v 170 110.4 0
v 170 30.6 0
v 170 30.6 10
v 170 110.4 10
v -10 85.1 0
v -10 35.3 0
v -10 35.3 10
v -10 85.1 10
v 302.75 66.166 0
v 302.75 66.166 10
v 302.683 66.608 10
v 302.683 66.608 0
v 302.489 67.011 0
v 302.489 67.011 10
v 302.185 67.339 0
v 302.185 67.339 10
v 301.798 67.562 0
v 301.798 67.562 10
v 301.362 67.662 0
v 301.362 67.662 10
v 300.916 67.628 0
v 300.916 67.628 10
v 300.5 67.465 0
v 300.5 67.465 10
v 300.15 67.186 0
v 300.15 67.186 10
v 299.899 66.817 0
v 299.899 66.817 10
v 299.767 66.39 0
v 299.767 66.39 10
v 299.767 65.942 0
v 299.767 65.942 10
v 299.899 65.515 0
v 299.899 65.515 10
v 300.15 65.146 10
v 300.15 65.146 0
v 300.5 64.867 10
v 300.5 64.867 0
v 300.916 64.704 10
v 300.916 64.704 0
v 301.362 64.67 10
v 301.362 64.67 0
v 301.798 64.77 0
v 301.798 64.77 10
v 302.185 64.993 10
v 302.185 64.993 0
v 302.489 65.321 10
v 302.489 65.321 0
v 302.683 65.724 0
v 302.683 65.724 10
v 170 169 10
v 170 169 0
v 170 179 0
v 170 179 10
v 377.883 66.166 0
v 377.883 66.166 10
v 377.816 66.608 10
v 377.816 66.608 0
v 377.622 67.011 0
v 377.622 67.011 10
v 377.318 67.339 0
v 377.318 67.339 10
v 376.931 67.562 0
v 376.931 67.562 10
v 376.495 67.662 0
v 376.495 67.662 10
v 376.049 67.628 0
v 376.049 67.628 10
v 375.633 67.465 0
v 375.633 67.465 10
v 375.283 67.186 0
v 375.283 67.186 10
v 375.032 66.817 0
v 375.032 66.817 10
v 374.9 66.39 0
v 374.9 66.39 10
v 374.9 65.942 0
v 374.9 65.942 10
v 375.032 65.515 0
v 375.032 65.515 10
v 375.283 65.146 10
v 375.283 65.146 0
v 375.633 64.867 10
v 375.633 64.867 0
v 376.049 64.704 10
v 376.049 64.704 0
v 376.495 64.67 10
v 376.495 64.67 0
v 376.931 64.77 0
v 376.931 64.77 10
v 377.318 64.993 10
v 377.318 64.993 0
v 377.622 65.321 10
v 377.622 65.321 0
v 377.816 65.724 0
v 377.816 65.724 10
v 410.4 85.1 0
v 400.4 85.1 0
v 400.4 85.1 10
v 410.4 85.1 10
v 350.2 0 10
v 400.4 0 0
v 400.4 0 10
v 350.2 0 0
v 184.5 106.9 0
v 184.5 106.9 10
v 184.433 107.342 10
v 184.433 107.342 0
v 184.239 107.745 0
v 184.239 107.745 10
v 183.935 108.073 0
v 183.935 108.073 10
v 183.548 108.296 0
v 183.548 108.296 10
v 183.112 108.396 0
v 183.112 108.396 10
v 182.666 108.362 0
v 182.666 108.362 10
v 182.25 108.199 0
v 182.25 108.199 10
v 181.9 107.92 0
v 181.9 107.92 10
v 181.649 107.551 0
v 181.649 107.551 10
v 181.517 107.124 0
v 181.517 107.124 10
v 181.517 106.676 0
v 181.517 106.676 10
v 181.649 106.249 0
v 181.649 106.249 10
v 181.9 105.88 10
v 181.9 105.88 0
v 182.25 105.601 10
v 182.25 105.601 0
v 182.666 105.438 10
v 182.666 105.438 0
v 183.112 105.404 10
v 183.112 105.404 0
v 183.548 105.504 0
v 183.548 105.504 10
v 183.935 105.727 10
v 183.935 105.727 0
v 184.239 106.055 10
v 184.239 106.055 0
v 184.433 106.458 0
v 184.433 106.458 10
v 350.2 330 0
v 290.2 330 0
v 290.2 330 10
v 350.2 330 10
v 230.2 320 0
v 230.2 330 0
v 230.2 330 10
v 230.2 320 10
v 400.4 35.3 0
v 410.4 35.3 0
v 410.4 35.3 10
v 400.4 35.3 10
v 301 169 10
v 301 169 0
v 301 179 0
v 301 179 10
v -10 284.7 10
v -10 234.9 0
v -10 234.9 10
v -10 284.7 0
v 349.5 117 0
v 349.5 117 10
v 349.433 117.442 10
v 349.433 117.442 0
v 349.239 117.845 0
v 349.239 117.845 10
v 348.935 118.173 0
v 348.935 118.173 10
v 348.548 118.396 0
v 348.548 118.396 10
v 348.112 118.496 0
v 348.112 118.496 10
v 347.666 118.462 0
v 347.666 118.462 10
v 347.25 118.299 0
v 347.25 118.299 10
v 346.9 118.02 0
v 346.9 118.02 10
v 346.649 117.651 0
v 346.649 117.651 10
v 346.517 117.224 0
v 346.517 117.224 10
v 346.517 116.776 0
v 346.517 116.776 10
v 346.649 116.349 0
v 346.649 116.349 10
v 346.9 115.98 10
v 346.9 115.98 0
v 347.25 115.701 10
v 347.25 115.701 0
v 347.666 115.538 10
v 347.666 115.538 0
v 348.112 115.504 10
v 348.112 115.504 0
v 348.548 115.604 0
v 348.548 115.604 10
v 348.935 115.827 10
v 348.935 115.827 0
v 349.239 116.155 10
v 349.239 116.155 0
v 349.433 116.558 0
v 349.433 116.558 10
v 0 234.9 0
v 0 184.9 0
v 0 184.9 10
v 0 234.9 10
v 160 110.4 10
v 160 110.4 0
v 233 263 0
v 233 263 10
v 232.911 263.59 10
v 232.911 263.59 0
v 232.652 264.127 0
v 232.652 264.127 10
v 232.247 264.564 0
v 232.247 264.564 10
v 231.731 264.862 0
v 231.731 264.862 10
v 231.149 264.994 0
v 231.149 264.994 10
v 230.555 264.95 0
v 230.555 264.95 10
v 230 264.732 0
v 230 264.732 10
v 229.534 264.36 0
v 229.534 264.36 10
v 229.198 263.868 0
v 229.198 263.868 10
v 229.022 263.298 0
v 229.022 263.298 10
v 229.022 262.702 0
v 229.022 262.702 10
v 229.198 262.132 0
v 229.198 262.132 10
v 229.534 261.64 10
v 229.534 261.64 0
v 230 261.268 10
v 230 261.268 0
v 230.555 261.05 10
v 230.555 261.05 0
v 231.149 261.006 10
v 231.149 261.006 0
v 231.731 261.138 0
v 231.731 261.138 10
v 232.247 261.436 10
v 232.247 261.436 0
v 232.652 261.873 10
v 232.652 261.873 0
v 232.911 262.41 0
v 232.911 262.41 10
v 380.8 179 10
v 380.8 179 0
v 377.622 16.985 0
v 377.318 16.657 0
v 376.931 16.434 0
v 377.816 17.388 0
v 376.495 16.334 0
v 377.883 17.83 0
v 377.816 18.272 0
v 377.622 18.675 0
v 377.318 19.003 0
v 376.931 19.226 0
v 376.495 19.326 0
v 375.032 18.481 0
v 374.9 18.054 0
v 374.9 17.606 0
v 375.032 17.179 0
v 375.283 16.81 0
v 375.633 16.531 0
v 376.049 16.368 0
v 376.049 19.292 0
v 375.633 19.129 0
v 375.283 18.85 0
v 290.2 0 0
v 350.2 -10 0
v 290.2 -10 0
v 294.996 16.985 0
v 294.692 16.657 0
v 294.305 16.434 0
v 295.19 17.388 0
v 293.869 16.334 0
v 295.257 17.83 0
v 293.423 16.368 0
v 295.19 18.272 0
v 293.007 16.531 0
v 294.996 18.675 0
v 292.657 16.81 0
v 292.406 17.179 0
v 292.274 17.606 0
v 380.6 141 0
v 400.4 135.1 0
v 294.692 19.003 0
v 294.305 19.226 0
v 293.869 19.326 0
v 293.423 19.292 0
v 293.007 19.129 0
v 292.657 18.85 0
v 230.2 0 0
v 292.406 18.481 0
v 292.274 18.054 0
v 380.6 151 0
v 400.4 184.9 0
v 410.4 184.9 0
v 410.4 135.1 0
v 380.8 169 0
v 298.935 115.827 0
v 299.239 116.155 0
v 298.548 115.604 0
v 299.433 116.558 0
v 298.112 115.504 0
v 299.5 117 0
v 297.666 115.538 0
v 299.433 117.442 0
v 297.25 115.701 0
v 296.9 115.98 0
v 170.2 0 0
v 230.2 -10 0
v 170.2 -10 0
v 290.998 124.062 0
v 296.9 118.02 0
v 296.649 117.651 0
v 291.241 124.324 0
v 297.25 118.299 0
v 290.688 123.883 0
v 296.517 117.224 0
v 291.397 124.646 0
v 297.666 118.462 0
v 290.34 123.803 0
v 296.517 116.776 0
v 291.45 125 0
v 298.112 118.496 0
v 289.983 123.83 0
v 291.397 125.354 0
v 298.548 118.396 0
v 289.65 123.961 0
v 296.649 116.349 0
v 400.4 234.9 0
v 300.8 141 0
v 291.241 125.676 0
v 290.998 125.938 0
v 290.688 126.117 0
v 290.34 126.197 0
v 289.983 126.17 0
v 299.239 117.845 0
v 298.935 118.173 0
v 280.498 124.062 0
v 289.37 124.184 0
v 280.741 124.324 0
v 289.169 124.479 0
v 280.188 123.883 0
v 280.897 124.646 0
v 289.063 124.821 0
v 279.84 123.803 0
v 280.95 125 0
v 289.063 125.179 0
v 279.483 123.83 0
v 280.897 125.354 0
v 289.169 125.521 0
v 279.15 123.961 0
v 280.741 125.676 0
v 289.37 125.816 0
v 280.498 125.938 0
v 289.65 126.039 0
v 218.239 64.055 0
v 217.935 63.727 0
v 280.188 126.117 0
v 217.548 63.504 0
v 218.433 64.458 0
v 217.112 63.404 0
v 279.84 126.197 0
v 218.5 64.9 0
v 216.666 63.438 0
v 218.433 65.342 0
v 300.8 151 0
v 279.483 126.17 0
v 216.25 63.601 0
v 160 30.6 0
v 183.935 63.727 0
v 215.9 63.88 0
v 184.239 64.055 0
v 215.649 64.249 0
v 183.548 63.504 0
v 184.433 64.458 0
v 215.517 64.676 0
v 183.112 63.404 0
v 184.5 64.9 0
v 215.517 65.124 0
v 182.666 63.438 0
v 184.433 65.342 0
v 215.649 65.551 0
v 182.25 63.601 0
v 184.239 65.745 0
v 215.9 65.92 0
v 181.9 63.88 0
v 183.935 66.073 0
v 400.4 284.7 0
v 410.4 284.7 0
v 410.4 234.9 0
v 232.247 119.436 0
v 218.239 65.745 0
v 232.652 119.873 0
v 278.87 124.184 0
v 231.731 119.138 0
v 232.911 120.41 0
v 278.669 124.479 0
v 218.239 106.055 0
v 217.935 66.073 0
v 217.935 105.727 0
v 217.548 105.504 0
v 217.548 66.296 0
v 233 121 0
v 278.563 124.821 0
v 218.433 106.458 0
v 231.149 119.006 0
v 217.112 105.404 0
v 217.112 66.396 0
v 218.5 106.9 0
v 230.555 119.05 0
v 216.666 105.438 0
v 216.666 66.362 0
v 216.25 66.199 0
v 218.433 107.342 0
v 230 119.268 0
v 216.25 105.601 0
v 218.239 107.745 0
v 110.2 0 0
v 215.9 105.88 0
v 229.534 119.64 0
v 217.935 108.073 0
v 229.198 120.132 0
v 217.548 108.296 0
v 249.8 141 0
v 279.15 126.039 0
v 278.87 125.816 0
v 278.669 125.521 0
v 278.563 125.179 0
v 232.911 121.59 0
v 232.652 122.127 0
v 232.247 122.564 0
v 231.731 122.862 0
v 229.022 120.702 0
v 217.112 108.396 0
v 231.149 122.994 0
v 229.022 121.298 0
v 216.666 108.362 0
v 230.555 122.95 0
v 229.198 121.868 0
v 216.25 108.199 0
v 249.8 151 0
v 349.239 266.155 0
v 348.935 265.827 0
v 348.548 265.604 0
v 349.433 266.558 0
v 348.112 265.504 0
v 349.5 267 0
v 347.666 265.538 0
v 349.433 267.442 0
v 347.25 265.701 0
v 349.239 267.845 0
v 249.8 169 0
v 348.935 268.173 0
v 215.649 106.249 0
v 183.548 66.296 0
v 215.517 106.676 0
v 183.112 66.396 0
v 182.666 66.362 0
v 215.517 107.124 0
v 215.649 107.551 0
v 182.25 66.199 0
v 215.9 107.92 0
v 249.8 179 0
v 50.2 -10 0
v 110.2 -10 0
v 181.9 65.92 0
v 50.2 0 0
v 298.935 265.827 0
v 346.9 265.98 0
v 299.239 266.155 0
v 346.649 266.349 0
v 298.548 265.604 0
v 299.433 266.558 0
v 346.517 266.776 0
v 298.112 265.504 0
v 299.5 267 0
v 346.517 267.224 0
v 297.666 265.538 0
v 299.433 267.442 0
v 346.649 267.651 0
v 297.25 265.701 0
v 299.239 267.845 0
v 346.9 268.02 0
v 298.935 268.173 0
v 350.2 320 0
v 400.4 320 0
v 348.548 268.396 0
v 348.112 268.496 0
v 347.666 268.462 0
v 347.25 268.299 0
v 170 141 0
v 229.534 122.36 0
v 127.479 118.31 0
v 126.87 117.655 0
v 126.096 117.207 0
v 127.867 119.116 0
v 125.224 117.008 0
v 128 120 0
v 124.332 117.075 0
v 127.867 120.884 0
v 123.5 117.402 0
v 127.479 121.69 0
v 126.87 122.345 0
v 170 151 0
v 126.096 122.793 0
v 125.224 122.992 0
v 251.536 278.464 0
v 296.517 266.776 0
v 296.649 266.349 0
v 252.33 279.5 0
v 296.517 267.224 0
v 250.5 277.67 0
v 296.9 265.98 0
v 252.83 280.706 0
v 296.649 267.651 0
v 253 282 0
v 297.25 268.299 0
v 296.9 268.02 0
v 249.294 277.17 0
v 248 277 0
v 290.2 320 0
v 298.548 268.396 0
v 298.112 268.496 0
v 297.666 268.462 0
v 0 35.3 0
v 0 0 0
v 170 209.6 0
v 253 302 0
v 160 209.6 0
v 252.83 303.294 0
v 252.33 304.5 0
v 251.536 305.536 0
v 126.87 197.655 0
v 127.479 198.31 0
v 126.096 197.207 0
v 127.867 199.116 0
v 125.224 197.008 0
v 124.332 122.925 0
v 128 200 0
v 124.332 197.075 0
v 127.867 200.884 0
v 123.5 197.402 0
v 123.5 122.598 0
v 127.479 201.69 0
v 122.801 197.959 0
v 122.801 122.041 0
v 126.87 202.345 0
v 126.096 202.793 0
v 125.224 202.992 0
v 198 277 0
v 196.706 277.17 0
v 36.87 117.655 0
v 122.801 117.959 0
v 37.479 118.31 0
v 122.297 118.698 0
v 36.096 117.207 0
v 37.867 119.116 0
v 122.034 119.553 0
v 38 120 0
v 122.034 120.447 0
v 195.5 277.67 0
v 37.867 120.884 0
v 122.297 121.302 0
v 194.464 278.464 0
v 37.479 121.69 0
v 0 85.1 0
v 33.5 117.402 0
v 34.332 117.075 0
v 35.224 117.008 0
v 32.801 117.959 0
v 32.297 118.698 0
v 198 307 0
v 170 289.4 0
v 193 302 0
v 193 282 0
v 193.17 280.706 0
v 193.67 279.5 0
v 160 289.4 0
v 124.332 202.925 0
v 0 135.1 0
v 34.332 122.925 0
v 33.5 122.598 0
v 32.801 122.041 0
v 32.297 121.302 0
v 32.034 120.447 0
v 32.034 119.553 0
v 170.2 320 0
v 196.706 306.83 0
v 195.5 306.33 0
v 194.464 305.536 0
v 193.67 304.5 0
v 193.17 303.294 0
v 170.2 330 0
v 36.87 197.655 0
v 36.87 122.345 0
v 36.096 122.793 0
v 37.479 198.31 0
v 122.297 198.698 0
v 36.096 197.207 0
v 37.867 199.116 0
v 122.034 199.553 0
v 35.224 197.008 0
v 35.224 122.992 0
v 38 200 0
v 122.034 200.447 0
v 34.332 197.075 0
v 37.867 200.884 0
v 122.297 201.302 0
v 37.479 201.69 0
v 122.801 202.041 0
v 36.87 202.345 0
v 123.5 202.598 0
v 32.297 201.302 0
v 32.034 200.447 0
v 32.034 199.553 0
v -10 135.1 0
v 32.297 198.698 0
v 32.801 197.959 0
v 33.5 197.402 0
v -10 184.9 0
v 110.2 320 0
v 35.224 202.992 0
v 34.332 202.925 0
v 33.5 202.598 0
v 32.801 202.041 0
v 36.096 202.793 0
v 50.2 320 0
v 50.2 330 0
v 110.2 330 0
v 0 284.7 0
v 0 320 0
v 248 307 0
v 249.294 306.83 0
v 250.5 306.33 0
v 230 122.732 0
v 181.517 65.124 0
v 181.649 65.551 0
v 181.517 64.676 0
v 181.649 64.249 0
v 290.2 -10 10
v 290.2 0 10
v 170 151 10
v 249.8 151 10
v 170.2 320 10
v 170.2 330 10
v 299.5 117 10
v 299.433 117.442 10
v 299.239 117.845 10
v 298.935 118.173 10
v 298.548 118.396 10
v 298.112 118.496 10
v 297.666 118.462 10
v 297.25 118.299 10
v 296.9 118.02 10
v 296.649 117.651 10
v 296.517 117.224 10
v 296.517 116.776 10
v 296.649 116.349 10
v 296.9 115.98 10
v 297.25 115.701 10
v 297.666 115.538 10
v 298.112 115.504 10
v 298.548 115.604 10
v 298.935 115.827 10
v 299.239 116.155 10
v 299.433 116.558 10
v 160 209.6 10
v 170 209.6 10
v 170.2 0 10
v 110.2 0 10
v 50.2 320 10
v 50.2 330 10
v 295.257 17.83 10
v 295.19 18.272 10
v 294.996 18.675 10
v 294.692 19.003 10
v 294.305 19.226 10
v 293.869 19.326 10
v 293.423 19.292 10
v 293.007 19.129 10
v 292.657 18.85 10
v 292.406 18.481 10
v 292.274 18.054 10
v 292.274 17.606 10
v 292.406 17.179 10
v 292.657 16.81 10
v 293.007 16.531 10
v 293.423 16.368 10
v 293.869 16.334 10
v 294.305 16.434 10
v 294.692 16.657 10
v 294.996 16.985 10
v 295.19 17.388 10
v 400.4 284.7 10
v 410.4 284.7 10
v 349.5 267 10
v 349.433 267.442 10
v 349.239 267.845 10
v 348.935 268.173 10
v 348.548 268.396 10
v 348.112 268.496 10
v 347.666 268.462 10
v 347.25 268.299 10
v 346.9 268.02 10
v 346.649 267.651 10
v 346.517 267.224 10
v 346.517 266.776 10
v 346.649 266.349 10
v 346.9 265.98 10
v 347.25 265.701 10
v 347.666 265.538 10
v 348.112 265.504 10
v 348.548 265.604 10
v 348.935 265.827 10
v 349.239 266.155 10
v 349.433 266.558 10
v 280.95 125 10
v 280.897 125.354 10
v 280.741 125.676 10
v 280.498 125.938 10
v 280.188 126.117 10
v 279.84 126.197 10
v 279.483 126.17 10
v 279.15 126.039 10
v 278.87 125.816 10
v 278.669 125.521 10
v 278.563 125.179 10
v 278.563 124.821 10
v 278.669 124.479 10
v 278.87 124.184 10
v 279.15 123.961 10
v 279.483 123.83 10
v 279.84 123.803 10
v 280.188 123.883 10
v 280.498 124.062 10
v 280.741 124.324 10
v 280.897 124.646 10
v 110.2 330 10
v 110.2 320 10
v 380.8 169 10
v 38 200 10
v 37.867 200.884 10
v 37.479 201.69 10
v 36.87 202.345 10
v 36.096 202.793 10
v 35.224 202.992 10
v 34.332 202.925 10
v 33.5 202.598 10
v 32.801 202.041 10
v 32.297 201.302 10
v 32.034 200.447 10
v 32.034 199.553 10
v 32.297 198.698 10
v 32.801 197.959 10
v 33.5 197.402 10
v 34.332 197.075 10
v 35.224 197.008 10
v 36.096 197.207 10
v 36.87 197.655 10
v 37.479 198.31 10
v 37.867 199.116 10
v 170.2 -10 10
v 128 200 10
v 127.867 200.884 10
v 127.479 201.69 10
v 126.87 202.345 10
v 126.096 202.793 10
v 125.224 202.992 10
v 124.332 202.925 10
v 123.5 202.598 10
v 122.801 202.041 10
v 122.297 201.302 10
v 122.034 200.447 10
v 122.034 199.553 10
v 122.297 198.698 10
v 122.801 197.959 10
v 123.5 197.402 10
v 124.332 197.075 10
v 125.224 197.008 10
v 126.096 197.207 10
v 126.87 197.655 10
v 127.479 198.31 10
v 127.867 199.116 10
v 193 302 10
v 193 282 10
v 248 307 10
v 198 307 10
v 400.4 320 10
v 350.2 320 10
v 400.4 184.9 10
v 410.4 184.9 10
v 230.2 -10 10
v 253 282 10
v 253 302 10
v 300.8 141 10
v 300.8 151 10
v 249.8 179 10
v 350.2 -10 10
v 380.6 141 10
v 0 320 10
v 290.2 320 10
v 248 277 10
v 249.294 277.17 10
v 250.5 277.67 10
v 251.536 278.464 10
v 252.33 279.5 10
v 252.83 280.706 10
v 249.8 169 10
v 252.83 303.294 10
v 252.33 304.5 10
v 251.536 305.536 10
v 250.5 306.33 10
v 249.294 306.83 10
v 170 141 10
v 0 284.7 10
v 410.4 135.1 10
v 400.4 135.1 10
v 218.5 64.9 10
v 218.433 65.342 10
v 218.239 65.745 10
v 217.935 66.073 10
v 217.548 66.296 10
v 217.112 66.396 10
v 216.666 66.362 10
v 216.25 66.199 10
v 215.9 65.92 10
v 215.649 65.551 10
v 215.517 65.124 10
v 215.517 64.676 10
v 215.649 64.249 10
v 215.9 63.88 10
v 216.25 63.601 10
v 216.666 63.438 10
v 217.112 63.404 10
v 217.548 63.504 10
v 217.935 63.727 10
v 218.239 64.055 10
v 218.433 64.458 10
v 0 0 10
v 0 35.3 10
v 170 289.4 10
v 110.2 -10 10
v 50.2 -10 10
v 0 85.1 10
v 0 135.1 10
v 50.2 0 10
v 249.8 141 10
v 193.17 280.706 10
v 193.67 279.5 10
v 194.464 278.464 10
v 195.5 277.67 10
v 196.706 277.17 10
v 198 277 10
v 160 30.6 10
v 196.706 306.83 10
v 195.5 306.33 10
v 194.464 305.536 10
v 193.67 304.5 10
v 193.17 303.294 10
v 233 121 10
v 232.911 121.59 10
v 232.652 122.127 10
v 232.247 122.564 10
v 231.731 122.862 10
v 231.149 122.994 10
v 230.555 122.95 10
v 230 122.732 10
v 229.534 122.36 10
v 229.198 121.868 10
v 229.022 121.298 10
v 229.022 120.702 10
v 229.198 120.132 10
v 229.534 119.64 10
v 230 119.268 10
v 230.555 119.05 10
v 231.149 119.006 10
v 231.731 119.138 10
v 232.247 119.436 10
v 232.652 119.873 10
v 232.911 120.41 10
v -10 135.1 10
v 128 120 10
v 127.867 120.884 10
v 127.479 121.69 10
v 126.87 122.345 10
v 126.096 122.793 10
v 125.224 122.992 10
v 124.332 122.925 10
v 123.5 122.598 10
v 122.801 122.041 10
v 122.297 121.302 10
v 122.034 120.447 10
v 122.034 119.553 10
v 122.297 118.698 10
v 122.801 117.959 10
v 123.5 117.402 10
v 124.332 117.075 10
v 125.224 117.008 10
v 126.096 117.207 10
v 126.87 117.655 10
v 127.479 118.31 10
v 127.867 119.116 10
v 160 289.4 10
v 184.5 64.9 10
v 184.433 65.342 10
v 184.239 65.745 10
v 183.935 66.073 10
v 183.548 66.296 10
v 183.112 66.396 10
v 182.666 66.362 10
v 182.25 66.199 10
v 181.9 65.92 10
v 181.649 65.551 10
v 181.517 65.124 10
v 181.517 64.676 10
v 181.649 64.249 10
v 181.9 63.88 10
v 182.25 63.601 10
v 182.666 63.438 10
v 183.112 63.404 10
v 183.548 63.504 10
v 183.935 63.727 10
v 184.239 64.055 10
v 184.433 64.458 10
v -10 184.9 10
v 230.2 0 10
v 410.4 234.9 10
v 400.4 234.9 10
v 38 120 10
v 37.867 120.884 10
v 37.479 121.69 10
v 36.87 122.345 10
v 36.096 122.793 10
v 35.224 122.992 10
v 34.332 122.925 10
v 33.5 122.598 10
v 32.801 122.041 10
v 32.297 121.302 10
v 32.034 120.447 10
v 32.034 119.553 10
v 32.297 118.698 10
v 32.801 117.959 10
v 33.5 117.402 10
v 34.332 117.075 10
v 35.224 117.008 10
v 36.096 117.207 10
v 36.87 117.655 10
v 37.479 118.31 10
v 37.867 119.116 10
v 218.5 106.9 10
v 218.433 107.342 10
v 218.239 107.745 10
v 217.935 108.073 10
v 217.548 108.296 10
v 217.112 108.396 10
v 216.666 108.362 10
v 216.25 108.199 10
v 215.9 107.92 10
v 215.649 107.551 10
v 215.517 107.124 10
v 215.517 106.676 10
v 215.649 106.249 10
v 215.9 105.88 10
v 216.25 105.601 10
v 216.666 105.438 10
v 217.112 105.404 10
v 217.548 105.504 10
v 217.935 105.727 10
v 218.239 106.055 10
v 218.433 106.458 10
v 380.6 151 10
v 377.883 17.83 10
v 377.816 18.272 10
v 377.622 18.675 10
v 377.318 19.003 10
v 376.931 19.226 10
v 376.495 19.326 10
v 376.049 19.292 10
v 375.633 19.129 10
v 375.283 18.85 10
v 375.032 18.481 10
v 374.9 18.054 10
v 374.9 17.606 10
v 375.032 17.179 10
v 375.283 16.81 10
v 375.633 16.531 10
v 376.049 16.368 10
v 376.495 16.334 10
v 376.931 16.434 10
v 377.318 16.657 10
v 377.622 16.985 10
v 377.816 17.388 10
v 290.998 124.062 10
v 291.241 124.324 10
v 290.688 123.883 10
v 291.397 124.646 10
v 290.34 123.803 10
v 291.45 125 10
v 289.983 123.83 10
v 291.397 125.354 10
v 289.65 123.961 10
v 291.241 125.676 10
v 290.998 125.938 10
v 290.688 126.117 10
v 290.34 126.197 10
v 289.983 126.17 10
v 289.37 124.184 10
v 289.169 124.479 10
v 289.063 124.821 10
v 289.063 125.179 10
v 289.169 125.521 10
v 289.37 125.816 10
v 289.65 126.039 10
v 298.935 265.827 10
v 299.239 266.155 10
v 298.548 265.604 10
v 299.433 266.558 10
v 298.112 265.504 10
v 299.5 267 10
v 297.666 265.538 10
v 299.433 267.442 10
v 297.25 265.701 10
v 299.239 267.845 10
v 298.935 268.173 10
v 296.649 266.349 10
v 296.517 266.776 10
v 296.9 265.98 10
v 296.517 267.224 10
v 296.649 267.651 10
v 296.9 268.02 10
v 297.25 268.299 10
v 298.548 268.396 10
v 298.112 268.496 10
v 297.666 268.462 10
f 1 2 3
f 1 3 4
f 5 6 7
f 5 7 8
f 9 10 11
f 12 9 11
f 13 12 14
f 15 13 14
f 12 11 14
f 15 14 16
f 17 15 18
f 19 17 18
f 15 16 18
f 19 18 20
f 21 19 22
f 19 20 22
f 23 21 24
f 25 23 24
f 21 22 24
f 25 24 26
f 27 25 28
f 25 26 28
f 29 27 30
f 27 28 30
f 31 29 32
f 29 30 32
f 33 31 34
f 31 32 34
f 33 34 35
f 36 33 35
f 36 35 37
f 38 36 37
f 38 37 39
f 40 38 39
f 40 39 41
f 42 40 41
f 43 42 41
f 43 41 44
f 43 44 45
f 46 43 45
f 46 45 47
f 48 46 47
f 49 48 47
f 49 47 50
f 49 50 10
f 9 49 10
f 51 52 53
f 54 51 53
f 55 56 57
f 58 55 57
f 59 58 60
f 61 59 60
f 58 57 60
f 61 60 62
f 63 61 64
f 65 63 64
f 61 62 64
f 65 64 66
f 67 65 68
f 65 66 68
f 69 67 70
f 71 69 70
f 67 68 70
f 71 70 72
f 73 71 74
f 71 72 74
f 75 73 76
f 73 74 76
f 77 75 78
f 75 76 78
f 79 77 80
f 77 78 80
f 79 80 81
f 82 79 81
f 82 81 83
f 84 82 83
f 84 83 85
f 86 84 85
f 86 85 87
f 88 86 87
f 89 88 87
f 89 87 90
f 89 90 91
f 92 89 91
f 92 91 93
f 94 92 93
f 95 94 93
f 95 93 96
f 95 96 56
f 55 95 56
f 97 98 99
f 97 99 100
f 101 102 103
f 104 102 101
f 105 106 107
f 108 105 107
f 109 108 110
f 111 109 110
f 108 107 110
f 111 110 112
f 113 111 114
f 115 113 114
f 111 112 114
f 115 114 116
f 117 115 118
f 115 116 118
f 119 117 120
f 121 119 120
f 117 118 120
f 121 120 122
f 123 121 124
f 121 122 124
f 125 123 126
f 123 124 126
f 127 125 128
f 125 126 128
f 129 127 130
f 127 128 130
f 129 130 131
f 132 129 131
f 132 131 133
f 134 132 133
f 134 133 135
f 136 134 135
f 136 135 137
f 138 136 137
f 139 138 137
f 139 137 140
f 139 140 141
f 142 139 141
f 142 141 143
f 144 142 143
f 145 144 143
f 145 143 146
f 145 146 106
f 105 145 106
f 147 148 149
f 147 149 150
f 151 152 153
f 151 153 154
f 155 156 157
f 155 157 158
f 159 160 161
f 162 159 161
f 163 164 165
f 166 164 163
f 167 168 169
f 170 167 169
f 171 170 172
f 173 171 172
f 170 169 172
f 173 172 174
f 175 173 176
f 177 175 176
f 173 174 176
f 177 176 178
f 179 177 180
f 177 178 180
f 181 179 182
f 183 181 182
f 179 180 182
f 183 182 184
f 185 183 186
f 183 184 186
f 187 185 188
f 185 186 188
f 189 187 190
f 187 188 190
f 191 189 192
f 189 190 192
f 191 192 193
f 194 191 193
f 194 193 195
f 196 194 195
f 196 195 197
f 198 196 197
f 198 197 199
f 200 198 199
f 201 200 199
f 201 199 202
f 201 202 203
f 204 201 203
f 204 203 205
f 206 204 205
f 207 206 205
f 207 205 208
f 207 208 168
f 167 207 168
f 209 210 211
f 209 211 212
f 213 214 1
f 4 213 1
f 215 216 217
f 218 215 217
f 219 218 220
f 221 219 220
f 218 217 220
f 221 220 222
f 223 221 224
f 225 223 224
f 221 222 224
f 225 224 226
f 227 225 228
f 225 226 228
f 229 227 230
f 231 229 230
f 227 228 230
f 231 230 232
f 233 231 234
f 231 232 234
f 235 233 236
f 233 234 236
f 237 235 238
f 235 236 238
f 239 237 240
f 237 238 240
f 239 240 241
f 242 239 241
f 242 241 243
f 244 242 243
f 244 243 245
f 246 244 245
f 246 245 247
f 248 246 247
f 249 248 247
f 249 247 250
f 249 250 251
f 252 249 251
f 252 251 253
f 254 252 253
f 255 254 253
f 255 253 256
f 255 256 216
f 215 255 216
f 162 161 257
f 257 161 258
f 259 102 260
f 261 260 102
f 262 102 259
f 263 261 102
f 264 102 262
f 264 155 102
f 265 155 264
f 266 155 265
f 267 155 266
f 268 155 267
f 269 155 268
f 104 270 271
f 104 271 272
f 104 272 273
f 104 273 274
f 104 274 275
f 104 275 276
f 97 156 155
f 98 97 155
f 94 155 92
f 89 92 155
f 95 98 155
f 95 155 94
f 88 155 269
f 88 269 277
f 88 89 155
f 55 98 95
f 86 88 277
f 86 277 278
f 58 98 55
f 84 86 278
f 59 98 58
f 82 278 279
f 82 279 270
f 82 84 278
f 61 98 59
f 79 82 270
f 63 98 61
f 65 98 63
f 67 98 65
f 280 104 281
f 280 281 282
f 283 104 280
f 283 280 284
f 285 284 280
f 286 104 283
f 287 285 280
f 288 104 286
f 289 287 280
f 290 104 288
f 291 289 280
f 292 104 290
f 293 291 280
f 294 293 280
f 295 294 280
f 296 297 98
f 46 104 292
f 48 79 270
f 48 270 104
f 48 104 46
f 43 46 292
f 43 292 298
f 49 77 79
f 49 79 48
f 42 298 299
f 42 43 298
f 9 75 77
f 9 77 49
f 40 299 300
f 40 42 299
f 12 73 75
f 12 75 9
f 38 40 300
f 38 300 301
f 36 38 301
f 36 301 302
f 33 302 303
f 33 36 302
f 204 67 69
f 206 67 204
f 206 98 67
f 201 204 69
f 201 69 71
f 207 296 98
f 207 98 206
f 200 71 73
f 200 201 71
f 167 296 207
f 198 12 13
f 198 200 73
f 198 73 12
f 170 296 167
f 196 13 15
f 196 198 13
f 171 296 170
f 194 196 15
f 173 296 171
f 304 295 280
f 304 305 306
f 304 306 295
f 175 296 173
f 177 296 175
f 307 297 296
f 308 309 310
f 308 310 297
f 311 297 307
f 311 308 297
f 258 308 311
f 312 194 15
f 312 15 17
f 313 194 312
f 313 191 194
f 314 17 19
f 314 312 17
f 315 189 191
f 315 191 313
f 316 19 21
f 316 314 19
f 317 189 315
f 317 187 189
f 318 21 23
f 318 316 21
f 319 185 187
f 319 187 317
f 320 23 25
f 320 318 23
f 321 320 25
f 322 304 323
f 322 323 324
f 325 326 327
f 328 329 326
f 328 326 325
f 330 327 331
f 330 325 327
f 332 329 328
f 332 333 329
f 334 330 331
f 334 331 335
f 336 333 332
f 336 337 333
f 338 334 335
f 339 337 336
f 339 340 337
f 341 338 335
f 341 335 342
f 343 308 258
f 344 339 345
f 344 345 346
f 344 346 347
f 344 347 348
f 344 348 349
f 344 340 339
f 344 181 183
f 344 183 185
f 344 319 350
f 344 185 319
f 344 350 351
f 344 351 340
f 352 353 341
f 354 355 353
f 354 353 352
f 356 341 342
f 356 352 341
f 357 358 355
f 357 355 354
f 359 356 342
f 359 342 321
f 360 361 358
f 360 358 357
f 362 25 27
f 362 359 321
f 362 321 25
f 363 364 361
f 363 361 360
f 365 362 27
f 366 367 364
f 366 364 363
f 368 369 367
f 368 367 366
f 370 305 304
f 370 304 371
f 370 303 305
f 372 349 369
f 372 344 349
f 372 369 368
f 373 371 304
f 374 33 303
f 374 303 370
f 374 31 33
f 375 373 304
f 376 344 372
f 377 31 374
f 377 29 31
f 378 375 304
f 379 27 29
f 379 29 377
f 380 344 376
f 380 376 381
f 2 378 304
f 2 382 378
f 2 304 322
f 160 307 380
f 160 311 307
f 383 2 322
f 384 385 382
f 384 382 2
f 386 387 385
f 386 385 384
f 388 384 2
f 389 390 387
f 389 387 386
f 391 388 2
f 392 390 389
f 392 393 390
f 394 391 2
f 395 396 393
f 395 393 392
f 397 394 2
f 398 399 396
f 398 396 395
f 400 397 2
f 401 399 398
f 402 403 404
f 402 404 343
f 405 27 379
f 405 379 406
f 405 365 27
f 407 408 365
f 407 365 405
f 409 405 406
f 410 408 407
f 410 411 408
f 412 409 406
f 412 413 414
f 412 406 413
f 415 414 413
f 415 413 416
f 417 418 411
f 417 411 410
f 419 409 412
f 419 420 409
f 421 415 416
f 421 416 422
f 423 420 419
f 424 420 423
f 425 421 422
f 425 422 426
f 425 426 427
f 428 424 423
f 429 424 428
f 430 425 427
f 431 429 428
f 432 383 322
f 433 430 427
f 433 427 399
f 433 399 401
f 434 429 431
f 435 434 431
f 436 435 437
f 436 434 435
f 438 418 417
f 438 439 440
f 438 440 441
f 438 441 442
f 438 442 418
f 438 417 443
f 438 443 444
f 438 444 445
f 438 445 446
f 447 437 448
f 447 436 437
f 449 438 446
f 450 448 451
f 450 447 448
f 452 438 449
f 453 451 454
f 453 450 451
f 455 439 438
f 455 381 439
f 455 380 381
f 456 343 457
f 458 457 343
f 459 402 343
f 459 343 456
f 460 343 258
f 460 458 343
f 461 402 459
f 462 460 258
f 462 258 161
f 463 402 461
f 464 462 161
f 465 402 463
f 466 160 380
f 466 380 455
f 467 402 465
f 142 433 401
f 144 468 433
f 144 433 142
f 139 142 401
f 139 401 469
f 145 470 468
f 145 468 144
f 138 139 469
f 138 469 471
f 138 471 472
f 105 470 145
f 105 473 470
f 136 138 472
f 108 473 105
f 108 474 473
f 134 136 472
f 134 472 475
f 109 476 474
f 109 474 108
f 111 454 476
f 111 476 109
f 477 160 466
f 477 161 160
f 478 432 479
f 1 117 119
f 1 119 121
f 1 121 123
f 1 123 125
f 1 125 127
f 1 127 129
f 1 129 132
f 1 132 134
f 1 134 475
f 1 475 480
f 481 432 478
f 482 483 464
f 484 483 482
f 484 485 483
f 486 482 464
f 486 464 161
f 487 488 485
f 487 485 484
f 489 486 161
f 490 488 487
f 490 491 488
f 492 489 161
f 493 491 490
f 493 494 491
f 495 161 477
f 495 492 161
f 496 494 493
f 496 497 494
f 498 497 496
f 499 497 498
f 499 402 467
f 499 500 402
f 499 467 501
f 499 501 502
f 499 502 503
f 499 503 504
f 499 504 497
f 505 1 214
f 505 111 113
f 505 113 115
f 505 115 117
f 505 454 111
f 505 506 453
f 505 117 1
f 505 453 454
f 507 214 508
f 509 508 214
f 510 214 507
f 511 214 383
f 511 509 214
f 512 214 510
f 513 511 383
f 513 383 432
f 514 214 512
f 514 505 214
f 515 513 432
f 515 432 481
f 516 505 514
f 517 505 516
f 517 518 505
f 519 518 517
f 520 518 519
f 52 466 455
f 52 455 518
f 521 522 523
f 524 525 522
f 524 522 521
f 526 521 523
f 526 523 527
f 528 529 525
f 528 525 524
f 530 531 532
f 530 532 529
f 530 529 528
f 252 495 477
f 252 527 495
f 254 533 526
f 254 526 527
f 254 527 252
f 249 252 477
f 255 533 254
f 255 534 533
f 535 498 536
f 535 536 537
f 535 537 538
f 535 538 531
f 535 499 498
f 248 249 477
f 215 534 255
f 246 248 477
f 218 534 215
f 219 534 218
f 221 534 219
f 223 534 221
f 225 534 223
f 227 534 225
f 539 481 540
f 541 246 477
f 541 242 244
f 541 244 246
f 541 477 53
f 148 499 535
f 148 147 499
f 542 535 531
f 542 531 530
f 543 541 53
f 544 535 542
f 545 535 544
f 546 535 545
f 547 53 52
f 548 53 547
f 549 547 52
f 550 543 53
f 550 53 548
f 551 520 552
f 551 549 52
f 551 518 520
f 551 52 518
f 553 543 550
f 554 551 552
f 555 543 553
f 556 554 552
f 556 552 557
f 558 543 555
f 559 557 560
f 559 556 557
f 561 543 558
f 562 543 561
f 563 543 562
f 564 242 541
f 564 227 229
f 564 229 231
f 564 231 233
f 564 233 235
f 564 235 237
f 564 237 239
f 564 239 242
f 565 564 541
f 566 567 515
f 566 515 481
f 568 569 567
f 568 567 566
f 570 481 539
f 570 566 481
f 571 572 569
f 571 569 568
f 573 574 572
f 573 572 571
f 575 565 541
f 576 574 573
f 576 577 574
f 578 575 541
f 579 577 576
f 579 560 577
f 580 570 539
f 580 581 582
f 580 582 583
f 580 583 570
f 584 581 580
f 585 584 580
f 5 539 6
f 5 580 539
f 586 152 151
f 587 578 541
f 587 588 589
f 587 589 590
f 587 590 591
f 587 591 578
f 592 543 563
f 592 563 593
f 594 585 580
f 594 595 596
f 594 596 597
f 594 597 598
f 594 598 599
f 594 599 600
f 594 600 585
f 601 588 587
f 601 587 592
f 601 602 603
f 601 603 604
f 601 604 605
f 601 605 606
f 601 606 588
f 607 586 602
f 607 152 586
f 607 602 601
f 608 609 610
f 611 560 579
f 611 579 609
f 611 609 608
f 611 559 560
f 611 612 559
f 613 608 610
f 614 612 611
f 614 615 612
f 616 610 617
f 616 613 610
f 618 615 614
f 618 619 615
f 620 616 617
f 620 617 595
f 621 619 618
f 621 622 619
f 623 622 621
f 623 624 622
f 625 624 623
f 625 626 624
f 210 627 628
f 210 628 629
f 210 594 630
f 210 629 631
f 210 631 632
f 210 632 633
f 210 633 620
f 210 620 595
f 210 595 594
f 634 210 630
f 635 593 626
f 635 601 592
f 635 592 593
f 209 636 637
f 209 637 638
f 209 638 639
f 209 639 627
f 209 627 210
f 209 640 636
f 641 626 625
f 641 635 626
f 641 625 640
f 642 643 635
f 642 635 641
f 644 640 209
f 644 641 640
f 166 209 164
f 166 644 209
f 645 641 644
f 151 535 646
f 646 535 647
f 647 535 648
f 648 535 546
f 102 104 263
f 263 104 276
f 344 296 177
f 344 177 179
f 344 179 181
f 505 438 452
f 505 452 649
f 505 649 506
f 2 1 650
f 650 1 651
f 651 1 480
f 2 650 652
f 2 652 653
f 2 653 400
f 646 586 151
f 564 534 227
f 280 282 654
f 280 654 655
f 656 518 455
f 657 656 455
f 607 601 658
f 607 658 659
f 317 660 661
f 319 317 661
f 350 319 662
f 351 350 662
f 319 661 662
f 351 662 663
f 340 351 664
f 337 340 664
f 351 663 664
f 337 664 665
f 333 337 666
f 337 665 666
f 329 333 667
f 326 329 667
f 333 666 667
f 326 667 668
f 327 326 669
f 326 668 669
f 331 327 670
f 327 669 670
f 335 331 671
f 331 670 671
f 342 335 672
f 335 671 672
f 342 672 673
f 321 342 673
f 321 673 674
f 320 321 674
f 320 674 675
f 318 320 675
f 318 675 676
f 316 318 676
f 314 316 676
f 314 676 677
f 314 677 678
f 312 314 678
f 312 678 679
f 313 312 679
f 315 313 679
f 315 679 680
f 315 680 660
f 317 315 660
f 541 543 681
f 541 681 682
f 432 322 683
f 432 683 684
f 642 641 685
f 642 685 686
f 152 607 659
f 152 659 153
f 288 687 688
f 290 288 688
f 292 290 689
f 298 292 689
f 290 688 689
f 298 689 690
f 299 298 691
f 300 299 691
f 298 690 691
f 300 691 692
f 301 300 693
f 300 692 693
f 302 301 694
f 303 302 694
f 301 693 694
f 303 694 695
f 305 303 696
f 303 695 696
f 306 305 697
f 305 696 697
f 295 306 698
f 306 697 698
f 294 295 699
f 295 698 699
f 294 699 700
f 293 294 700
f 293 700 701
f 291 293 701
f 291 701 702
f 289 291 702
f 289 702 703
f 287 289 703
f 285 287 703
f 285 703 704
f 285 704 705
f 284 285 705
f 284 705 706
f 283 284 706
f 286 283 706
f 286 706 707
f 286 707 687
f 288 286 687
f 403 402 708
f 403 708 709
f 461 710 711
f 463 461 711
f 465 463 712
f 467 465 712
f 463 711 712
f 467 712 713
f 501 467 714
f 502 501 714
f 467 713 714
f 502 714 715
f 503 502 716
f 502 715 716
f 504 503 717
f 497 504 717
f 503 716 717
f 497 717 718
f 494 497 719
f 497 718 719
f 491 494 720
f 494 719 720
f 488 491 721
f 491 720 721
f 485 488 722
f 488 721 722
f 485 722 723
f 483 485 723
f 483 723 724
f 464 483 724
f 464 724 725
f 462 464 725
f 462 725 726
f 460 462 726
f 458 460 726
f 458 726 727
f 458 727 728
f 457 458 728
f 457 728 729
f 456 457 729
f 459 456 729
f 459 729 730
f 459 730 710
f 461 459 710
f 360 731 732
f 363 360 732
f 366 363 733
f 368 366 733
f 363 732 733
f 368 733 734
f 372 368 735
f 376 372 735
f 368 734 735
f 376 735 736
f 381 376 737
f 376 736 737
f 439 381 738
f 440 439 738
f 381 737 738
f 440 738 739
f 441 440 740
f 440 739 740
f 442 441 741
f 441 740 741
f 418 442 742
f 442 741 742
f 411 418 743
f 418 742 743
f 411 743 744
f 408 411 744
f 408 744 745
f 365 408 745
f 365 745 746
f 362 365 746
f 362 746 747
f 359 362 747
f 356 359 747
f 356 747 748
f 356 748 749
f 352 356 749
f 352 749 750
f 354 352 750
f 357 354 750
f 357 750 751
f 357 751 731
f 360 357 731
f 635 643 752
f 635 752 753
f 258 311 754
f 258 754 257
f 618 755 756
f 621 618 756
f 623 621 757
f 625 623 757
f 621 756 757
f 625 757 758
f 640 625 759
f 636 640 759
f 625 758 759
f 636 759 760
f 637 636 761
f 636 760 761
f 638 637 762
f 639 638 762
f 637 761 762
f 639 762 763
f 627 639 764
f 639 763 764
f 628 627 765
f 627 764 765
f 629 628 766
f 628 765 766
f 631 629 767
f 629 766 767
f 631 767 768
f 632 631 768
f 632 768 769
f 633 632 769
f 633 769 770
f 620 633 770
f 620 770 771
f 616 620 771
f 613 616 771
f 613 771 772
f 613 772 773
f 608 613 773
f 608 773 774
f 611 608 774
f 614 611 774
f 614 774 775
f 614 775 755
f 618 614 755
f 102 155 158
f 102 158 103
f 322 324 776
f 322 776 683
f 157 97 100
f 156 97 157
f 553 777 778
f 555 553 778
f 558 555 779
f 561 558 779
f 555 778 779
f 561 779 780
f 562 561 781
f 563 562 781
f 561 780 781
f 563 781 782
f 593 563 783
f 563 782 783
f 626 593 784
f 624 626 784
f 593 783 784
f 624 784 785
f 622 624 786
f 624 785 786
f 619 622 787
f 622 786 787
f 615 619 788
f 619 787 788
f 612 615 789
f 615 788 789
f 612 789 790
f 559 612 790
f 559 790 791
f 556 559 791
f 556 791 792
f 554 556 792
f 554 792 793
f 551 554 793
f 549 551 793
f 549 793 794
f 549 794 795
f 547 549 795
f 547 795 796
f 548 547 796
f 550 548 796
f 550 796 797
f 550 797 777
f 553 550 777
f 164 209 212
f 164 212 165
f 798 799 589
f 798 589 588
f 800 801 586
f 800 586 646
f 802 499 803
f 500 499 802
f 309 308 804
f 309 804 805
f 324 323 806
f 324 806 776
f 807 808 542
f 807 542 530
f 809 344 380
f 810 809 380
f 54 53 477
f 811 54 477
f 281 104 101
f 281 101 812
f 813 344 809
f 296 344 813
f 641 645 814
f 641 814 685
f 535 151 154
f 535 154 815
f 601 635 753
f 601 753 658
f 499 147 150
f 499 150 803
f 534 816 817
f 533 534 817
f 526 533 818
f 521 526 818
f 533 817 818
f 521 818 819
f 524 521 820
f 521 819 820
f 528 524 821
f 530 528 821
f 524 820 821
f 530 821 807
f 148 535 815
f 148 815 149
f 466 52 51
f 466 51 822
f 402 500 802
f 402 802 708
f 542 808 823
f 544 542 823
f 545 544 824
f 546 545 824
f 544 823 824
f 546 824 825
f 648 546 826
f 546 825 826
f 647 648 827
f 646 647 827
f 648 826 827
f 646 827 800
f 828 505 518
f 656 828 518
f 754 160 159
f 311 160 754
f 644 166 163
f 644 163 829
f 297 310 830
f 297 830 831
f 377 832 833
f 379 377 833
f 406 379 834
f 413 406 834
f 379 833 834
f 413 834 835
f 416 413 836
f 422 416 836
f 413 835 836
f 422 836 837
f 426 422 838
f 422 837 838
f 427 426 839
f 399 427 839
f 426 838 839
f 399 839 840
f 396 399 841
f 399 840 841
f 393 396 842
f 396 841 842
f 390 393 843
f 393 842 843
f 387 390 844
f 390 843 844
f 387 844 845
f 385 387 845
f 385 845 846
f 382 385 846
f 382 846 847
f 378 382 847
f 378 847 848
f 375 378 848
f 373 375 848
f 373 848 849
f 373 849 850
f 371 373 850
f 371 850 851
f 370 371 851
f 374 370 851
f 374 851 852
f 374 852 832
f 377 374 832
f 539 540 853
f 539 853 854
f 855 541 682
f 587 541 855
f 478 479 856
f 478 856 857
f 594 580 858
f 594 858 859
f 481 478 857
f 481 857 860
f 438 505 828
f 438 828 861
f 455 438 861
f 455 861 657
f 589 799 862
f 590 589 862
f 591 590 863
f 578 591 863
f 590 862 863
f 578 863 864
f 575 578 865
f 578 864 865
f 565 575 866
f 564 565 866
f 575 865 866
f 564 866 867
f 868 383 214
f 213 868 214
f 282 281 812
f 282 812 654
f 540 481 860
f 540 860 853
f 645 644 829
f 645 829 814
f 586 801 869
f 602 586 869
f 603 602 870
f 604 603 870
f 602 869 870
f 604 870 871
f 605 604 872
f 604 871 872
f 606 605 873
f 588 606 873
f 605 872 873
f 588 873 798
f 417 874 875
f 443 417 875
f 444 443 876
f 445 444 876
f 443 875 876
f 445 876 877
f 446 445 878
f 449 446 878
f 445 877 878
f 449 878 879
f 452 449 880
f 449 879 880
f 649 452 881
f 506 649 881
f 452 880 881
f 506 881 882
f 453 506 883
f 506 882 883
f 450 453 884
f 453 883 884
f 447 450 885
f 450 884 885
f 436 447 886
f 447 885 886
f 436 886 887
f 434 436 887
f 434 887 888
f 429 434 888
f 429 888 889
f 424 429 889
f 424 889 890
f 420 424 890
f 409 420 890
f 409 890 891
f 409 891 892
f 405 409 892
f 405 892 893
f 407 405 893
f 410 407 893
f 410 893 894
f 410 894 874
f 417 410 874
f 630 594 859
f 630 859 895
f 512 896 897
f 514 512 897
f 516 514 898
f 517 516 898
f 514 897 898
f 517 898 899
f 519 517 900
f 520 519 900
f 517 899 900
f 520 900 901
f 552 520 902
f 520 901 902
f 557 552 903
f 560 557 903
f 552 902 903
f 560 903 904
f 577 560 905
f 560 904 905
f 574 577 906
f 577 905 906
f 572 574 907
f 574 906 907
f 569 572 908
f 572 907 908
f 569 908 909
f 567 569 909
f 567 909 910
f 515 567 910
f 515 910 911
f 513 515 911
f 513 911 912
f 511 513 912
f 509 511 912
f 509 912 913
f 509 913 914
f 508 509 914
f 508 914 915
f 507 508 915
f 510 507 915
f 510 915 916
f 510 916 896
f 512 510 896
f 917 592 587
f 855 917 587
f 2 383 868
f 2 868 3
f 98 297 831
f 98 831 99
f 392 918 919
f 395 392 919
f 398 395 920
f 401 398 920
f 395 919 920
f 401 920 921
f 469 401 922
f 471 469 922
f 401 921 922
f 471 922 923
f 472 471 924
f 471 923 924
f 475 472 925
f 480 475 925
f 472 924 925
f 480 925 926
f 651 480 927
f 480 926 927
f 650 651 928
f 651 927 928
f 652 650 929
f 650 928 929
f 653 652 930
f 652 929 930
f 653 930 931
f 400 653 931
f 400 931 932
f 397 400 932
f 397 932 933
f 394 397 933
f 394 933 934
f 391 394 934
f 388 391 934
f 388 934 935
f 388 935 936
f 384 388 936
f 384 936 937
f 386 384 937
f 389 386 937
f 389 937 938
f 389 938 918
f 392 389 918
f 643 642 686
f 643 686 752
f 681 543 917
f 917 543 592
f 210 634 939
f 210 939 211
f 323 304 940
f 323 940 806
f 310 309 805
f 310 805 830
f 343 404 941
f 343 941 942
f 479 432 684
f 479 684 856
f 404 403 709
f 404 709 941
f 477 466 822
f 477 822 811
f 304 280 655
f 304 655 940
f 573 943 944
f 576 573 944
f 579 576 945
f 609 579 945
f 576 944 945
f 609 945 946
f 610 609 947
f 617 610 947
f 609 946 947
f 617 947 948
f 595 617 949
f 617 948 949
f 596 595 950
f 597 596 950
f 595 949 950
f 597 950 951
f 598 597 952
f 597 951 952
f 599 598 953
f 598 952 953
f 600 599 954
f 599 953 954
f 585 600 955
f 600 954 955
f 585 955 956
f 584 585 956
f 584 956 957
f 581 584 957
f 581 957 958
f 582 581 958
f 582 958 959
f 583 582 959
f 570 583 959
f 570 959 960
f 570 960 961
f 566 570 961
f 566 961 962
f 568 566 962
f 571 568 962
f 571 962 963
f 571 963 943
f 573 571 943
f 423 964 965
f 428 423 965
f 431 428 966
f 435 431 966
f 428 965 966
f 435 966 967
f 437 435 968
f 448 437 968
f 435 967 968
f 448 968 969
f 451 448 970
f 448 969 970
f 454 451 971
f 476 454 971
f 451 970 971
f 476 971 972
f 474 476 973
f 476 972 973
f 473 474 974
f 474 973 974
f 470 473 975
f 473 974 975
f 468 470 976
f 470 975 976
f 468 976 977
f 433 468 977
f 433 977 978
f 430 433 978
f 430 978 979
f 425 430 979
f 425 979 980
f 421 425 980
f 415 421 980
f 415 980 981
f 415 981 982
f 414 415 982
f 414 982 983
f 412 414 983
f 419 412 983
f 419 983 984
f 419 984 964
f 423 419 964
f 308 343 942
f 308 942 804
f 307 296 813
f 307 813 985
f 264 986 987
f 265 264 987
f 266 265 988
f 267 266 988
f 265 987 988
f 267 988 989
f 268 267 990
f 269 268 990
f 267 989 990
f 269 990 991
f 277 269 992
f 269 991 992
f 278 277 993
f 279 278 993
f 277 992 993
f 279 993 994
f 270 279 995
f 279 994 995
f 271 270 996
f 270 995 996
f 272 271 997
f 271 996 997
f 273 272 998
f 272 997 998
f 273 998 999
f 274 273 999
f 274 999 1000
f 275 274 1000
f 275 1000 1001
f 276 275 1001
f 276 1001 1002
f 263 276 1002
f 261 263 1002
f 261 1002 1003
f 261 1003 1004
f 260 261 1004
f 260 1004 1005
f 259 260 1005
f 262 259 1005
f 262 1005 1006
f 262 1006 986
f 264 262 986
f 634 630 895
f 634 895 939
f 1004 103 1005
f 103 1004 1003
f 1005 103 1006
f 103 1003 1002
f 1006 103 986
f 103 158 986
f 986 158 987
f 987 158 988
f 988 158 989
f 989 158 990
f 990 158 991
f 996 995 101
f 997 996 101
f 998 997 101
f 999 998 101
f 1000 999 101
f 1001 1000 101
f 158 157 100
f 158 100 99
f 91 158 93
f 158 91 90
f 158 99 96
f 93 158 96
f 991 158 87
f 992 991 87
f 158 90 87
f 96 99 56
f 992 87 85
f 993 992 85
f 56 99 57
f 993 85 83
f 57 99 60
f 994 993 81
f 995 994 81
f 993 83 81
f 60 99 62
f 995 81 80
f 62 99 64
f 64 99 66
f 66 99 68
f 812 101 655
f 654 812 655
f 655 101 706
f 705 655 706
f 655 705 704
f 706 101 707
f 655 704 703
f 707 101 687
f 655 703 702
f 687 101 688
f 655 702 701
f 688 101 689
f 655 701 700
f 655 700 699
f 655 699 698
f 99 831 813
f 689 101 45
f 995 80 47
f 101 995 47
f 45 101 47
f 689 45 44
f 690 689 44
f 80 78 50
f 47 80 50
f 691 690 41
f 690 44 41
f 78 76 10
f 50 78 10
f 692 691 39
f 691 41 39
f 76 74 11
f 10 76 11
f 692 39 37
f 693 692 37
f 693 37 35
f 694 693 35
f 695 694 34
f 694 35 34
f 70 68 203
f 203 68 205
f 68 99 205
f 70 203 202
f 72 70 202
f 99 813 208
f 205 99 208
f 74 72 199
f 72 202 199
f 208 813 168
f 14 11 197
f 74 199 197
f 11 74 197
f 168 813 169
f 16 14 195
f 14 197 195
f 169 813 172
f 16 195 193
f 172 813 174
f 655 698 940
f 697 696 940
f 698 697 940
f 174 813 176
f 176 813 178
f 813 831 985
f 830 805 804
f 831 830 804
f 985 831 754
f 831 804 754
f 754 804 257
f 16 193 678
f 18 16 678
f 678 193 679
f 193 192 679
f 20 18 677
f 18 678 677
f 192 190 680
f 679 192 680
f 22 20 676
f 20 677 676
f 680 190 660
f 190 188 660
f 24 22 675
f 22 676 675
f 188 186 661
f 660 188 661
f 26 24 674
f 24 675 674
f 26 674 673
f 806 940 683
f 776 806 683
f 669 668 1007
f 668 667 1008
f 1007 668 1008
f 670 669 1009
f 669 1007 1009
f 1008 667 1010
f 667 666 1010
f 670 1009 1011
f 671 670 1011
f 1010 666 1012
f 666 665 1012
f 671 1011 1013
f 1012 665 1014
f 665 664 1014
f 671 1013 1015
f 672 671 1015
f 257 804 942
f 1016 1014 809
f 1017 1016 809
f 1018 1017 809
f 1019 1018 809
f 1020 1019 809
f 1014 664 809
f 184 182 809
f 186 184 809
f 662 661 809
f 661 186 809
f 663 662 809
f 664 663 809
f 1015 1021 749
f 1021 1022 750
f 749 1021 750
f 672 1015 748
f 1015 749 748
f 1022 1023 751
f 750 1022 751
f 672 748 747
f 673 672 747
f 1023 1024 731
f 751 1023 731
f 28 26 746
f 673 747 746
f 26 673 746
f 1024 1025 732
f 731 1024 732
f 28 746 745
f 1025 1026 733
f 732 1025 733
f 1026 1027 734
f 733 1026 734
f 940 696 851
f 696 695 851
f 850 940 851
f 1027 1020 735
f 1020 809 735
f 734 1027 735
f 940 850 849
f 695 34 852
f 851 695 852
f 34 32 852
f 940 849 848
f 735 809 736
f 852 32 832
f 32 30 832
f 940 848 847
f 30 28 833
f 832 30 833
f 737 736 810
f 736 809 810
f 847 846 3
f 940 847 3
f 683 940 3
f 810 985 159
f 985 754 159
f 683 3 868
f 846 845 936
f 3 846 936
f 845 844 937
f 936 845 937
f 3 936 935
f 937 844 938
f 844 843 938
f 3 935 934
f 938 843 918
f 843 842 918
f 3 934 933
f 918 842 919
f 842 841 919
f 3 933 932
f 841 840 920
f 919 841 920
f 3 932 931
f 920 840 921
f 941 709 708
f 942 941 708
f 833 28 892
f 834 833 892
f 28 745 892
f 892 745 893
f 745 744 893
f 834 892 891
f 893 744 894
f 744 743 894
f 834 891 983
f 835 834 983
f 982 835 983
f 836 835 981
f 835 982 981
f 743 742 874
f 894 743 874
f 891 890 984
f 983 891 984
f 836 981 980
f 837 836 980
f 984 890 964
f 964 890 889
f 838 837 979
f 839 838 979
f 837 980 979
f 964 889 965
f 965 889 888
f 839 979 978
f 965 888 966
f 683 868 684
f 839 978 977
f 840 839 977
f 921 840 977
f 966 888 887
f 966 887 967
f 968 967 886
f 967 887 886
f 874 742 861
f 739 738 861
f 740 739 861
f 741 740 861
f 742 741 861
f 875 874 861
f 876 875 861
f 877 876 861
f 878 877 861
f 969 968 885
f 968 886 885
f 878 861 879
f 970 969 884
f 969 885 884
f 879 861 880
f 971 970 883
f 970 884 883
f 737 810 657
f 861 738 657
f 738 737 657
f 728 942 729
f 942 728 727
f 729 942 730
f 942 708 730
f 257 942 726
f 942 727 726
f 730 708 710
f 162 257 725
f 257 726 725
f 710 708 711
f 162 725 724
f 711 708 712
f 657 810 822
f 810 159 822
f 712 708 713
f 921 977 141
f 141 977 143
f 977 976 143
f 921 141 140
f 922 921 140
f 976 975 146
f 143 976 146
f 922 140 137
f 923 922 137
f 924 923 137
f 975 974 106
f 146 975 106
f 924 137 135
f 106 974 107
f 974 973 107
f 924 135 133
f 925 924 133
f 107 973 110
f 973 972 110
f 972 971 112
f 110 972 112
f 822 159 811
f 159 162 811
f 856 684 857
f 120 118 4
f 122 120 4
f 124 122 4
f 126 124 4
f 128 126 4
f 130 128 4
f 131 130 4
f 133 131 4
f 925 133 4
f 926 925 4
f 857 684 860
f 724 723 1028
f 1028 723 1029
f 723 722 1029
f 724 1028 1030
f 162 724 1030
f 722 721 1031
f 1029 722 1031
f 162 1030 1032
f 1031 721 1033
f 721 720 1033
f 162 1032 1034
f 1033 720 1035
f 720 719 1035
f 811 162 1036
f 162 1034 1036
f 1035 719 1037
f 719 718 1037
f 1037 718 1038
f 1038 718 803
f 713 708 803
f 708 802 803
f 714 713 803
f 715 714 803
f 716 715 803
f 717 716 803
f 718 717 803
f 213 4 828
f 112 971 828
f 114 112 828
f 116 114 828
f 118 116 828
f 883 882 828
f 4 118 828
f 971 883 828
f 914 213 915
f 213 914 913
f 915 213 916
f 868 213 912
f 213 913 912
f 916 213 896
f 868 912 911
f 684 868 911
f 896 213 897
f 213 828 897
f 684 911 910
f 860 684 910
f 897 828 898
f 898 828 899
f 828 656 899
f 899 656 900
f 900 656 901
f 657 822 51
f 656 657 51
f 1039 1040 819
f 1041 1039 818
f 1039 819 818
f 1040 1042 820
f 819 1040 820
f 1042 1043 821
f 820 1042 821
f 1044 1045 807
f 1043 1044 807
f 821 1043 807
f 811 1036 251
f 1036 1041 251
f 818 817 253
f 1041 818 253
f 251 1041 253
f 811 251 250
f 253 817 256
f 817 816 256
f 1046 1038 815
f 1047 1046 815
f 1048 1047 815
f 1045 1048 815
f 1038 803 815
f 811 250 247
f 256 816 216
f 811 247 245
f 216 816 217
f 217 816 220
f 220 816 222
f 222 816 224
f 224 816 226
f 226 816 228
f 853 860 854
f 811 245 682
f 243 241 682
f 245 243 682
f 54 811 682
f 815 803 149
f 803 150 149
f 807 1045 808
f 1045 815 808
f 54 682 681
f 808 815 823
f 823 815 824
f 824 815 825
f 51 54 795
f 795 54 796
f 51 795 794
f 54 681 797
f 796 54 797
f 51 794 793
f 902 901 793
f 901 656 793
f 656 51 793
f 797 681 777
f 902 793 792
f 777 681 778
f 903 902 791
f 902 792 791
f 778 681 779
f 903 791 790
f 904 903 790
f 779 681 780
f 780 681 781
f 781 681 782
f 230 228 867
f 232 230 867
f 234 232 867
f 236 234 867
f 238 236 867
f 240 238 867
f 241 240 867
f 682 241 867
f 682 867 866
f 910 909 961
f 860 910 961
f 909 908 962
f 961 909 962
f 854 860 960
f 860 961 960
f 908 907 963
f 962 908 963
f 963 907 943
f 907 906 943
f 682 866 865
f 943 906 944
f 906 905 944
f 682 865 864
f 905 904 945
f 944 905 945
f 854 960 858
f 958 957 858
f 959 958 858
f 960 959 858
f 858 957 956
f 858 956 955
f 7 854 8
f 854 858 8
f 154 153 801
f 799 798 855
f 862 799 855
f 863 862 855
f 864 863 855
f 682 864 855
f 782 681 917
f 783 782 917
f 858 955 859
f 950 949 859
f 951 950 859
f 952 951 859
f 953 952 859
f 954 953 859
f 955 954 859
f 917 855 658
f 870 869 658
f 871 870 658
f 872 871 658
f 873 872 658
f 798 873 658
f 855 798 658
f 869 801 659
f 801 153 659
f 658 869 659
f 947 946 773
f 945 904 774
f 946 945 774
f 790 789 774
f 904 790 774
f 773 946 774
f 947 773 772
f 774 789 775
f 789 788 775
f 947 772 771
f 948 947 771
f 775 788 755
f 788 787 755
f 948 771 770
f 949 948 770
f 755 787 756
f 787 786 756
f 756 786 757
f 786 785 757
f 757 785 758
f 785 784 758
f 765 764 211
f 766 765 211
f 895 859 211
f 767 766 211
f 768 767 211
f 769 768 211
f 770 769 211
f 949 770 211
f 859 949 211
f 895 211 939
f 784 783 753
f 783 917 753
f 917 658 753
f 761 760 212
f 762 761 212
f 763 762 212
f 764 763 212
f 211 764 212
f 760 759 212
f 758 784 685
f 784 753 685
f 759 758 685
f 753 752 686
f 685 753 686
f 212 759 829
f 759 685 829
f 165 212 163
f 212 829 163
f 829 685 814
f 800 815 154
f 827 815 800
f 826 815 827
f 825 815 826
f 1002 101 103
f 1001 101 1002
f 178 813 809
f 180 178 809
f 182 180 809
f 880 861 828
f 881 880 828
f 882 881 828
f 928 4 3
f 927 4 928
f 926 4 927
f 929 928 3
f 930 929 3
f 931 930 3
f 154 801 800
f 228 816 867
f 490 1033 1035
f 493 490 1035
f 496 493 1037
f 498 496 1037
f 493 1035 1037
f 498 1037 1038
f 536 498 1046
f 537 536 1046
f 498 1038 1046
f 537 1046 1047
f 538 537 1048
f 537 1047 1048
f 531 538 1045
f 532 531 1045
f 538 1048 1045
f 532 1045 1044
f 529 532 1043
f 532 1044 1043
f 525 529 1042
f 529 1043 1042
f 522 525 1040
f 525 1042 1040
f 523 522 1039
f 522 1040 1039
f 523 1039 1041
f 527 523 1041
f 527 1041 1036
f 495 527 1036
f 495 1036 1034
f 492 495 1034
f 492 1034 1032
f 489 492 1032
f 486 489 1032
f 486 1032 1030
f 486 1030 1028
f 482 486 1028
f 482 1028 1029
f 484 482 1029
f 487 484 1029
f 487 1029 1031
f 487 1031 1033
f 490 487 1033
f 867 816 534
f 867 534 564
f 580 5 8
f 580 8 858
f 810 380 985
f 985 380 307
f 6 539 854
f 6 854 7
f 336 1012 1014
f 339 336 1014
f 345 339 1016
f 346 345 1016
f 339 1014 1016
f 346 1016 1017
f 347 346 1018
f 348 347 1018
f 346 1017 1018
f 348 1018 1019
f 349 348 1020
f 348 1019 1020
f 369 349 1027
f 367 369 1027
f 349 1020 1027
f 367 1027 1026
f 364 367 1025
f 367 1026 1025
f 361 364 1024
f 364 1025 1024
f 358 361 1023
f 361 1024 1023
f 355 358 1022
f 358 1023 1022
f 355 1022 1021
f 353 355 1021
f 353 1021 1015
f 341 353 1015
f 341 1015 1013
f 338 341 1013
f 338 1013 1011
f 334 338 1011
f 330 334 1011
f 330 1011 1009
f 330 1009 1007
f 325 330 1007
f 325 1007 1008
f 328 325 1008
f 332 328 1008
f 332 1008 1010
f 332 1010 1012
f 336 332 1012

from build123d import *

# Parameters (mm, degrees)
SKETCH_W        = 10
SKETCH_H        = 79.8
SKETCH_W_2      = 79.8
SKETCH_H_2      = 10
PAD_DEPTH       = 10
SKETCH001_R     = 3
POCKET_DEPTH    = 10.001
SKETCH002_R     = 1.5
POCKET001_DEPTH = 10.001
SKETCH003_R     = 1.5
POCKET002_DEPTH = 10.001
SKETCH004_R     = 2
POCKET003_DEPTH = 10.001
POCKET004_DEPTH = 10.001
SKETCH006_R     = 1.2
POCKET005_DEPTH = 10.001
SKETCH007_R     = 1.5
POCKET006_DEPTH = 10.001


with BuildPart() as part:
    # Sketch → Pad (new body)
    with BuildSketch(Plane.XY):
        Polygon((0, 0), (0, 35.3), (-10, 35.3), (-10, 85.1), (0, 85.1), (0, 135.1), (-10, 135.1), (-10, 184.9), (0, 184.9), (0, 234.9), (-10, 234.9), (-10, 284.7), (0, 284.7), (0, 320), (50.2, 320), (50.2, 330), (110.2, 330), (110.2, 320), (170.2, 320), (170.2, 330), (230.2, 330), (230.2, 320), (290.2, 320), (290.2, 330), (350.2, 330), (350.2, 320), (400.4, 320), (400.4, 284.7), (410.4, 284.7), (410.4, 234.9), (400.4, 234.9), (400.4, 184.9), (410.4, 184.9), (410.4, 135.1), (400.4, 135.1), (400.4, 85.1), (410.4, 85.1), (410.4, 35.3), (400.4, 35.3), (400.4, 0), (350.2, 0), (350.2, -10), (290.2, -10), (290.2, 0), (230.2, 0), (230.2, -10), (170.2, -10), (170.2, 0), (110.2, 0), (110.2, -10), (50.2, -10), (50.2, 0), align=None)
        with Locations((165, 249.5)):
            Rectangle(SKETCH_W, SKETCH_H, mode=Mode.SUBTRACT)
        with Locations((165, 70.5)):
            Rectangle(SKETCH_W, SKETCH_H, mode=Mode.SUBTRACT)
        with Locations((209.9, 174)):
            Rectangle(SKETCH_W_2, SKETCH_H_2, mode=Mode.SUBTRACT)
        with Locations((340.9, 174)):
            Rectangle(SKETCH_W_2, SKETCH_H_2, mode=Mode.SUBTRACT)
        with Locations((209.9, 146)):
            Rectangle(SKETCH_W_2, SKETCH_H_2, mode=Mode.SUBTRACT)
        with Locations((340.7, 146)):
            Rectangle(SKETCH_W_2, SKETCH_H_2, mode=Mode.SUBTRACT)
    extrude(amount=PAD_DEPTH)

    # Sketch001 (on DatumPlane) → Pocket (cut, through all)
    with BuildSketch(Plane.XY.offset(10)):
        with Locations((35, 120)):
            Circle(SKETCH001_R)
        with Locations((125, 120)):
            Circle(SKETCH001_R)
        with Locations((125, 200)):
            Circle(SKETCH001_R)
        with Locations((35, 200)):
            Circle(SKETCH001_R)
    extrude(amount=-POCKET_DEPTH, mode=Mode.SUBTRACT)

    # Sketch002 (on DatumPlane) → Pocket001 (cut, through all)
    with BuildSketch(Plane.XY.offset(10)):
        with Locations((298, 267)):
            Circle(SKETCH002_R)
        with Locations((348, 267)):
            Circle(SKETCH002_R)
        with Locations((298, 117)):
            Circle(SKETCH002_R)
        with Locations((348, 117)):
            Circle(SKETCH002_R)
    extrude(amount=-POCKET001_DEPTH, mode=Mode.SUBTRACT)

    # Sketch003 (on DatumPlane) → Pocket002 (cut, through all)
    with BuildSketch(Plane.XY.offset(10)):
        with Locations((376.383, 66.166)):
            Circle(SKETCH003_R)
        with Locations((376.383, 17.83)):
            Circle(SKETCH003_R)
        with Locations((293.757, 17.83)):
            Circle(SKETCH003_R)
        with Locations((301.25, 66.166)):
            Circle(SKETCH003_R)
    extrude(amount=-POCKET002_DEPTH, mode=Mode.SUBTRACT)

    # Sketch004 (on DatumPlane) → Pocket003 (cut, through all)
    with BuildSketch(Plane.XY.offset(10)):
        with Locations((231, 263)):
            Circle(SKETCH004_R)
        with Locations((231, 121)):
            Circle(SKETCH004_R)
    extrude(amount=-POCKET003_DEPTH, mode=Mode.SUBTRACT)

    # Sketch005 (on DatumPlane) → Pocket004 (cut, through all)
    with BuildSketch(Plane.XY.offset(10)):
        with BuildLine():
            Line((198, 307), (248, 307))
            ThreePointArc((253, 302), (251.535534, 305.535534), (248, 307))
            Line((253, 302), (253, 282))
            ThreePointArc((248, 277), (251.535534, 278.464466), (253, 282))
            Line((248, 277), (198, 277))
            ThreePointArc((193, 282), (194.464466, 278.464466), (198, 277))
            Line((193, 282), (193, 302))
            ThreePointArc((198, 307), (194.464466, 305.535534), (193, 302))
        make_face()
    extrude(amount=-POCKET004_DEPTH, mode=Mode.SUBTRACT)

    # Sketch006 (on DatumPlane) → Pocket005 (cut, through all)
    with BuildSketch(Plane.XY.offset(10)):
        with Locations((279.75, 125)):
            Circle(SKETCH006_R)
        with Locations((290.25, 125)):
            Circle(SKETCH006_R)
    extrude(amount=-POCKET005_DEPTH, mode=Mode.SUBTRACT)

    # Sketch007 (on DatumPlane) → Pocket006 (cut, through all)
    with BuildSketch(Plane.XY.offset(10)):
        with Locations((183, 106.9)):
            Circle(SKETCH007_R)
        with Locations((217, 106.9)):
            Circle(SKETCH007_R)
        with Locations((217, 64.9)):
            Circle(SKETCH007_R)
        with Locations((183, 64.9)):
            Circle(SKETCH007_R)
    extrude(amount=-POCKET006_DEPTH, mode=Mode.SUBTRACT)


solid = part.part
